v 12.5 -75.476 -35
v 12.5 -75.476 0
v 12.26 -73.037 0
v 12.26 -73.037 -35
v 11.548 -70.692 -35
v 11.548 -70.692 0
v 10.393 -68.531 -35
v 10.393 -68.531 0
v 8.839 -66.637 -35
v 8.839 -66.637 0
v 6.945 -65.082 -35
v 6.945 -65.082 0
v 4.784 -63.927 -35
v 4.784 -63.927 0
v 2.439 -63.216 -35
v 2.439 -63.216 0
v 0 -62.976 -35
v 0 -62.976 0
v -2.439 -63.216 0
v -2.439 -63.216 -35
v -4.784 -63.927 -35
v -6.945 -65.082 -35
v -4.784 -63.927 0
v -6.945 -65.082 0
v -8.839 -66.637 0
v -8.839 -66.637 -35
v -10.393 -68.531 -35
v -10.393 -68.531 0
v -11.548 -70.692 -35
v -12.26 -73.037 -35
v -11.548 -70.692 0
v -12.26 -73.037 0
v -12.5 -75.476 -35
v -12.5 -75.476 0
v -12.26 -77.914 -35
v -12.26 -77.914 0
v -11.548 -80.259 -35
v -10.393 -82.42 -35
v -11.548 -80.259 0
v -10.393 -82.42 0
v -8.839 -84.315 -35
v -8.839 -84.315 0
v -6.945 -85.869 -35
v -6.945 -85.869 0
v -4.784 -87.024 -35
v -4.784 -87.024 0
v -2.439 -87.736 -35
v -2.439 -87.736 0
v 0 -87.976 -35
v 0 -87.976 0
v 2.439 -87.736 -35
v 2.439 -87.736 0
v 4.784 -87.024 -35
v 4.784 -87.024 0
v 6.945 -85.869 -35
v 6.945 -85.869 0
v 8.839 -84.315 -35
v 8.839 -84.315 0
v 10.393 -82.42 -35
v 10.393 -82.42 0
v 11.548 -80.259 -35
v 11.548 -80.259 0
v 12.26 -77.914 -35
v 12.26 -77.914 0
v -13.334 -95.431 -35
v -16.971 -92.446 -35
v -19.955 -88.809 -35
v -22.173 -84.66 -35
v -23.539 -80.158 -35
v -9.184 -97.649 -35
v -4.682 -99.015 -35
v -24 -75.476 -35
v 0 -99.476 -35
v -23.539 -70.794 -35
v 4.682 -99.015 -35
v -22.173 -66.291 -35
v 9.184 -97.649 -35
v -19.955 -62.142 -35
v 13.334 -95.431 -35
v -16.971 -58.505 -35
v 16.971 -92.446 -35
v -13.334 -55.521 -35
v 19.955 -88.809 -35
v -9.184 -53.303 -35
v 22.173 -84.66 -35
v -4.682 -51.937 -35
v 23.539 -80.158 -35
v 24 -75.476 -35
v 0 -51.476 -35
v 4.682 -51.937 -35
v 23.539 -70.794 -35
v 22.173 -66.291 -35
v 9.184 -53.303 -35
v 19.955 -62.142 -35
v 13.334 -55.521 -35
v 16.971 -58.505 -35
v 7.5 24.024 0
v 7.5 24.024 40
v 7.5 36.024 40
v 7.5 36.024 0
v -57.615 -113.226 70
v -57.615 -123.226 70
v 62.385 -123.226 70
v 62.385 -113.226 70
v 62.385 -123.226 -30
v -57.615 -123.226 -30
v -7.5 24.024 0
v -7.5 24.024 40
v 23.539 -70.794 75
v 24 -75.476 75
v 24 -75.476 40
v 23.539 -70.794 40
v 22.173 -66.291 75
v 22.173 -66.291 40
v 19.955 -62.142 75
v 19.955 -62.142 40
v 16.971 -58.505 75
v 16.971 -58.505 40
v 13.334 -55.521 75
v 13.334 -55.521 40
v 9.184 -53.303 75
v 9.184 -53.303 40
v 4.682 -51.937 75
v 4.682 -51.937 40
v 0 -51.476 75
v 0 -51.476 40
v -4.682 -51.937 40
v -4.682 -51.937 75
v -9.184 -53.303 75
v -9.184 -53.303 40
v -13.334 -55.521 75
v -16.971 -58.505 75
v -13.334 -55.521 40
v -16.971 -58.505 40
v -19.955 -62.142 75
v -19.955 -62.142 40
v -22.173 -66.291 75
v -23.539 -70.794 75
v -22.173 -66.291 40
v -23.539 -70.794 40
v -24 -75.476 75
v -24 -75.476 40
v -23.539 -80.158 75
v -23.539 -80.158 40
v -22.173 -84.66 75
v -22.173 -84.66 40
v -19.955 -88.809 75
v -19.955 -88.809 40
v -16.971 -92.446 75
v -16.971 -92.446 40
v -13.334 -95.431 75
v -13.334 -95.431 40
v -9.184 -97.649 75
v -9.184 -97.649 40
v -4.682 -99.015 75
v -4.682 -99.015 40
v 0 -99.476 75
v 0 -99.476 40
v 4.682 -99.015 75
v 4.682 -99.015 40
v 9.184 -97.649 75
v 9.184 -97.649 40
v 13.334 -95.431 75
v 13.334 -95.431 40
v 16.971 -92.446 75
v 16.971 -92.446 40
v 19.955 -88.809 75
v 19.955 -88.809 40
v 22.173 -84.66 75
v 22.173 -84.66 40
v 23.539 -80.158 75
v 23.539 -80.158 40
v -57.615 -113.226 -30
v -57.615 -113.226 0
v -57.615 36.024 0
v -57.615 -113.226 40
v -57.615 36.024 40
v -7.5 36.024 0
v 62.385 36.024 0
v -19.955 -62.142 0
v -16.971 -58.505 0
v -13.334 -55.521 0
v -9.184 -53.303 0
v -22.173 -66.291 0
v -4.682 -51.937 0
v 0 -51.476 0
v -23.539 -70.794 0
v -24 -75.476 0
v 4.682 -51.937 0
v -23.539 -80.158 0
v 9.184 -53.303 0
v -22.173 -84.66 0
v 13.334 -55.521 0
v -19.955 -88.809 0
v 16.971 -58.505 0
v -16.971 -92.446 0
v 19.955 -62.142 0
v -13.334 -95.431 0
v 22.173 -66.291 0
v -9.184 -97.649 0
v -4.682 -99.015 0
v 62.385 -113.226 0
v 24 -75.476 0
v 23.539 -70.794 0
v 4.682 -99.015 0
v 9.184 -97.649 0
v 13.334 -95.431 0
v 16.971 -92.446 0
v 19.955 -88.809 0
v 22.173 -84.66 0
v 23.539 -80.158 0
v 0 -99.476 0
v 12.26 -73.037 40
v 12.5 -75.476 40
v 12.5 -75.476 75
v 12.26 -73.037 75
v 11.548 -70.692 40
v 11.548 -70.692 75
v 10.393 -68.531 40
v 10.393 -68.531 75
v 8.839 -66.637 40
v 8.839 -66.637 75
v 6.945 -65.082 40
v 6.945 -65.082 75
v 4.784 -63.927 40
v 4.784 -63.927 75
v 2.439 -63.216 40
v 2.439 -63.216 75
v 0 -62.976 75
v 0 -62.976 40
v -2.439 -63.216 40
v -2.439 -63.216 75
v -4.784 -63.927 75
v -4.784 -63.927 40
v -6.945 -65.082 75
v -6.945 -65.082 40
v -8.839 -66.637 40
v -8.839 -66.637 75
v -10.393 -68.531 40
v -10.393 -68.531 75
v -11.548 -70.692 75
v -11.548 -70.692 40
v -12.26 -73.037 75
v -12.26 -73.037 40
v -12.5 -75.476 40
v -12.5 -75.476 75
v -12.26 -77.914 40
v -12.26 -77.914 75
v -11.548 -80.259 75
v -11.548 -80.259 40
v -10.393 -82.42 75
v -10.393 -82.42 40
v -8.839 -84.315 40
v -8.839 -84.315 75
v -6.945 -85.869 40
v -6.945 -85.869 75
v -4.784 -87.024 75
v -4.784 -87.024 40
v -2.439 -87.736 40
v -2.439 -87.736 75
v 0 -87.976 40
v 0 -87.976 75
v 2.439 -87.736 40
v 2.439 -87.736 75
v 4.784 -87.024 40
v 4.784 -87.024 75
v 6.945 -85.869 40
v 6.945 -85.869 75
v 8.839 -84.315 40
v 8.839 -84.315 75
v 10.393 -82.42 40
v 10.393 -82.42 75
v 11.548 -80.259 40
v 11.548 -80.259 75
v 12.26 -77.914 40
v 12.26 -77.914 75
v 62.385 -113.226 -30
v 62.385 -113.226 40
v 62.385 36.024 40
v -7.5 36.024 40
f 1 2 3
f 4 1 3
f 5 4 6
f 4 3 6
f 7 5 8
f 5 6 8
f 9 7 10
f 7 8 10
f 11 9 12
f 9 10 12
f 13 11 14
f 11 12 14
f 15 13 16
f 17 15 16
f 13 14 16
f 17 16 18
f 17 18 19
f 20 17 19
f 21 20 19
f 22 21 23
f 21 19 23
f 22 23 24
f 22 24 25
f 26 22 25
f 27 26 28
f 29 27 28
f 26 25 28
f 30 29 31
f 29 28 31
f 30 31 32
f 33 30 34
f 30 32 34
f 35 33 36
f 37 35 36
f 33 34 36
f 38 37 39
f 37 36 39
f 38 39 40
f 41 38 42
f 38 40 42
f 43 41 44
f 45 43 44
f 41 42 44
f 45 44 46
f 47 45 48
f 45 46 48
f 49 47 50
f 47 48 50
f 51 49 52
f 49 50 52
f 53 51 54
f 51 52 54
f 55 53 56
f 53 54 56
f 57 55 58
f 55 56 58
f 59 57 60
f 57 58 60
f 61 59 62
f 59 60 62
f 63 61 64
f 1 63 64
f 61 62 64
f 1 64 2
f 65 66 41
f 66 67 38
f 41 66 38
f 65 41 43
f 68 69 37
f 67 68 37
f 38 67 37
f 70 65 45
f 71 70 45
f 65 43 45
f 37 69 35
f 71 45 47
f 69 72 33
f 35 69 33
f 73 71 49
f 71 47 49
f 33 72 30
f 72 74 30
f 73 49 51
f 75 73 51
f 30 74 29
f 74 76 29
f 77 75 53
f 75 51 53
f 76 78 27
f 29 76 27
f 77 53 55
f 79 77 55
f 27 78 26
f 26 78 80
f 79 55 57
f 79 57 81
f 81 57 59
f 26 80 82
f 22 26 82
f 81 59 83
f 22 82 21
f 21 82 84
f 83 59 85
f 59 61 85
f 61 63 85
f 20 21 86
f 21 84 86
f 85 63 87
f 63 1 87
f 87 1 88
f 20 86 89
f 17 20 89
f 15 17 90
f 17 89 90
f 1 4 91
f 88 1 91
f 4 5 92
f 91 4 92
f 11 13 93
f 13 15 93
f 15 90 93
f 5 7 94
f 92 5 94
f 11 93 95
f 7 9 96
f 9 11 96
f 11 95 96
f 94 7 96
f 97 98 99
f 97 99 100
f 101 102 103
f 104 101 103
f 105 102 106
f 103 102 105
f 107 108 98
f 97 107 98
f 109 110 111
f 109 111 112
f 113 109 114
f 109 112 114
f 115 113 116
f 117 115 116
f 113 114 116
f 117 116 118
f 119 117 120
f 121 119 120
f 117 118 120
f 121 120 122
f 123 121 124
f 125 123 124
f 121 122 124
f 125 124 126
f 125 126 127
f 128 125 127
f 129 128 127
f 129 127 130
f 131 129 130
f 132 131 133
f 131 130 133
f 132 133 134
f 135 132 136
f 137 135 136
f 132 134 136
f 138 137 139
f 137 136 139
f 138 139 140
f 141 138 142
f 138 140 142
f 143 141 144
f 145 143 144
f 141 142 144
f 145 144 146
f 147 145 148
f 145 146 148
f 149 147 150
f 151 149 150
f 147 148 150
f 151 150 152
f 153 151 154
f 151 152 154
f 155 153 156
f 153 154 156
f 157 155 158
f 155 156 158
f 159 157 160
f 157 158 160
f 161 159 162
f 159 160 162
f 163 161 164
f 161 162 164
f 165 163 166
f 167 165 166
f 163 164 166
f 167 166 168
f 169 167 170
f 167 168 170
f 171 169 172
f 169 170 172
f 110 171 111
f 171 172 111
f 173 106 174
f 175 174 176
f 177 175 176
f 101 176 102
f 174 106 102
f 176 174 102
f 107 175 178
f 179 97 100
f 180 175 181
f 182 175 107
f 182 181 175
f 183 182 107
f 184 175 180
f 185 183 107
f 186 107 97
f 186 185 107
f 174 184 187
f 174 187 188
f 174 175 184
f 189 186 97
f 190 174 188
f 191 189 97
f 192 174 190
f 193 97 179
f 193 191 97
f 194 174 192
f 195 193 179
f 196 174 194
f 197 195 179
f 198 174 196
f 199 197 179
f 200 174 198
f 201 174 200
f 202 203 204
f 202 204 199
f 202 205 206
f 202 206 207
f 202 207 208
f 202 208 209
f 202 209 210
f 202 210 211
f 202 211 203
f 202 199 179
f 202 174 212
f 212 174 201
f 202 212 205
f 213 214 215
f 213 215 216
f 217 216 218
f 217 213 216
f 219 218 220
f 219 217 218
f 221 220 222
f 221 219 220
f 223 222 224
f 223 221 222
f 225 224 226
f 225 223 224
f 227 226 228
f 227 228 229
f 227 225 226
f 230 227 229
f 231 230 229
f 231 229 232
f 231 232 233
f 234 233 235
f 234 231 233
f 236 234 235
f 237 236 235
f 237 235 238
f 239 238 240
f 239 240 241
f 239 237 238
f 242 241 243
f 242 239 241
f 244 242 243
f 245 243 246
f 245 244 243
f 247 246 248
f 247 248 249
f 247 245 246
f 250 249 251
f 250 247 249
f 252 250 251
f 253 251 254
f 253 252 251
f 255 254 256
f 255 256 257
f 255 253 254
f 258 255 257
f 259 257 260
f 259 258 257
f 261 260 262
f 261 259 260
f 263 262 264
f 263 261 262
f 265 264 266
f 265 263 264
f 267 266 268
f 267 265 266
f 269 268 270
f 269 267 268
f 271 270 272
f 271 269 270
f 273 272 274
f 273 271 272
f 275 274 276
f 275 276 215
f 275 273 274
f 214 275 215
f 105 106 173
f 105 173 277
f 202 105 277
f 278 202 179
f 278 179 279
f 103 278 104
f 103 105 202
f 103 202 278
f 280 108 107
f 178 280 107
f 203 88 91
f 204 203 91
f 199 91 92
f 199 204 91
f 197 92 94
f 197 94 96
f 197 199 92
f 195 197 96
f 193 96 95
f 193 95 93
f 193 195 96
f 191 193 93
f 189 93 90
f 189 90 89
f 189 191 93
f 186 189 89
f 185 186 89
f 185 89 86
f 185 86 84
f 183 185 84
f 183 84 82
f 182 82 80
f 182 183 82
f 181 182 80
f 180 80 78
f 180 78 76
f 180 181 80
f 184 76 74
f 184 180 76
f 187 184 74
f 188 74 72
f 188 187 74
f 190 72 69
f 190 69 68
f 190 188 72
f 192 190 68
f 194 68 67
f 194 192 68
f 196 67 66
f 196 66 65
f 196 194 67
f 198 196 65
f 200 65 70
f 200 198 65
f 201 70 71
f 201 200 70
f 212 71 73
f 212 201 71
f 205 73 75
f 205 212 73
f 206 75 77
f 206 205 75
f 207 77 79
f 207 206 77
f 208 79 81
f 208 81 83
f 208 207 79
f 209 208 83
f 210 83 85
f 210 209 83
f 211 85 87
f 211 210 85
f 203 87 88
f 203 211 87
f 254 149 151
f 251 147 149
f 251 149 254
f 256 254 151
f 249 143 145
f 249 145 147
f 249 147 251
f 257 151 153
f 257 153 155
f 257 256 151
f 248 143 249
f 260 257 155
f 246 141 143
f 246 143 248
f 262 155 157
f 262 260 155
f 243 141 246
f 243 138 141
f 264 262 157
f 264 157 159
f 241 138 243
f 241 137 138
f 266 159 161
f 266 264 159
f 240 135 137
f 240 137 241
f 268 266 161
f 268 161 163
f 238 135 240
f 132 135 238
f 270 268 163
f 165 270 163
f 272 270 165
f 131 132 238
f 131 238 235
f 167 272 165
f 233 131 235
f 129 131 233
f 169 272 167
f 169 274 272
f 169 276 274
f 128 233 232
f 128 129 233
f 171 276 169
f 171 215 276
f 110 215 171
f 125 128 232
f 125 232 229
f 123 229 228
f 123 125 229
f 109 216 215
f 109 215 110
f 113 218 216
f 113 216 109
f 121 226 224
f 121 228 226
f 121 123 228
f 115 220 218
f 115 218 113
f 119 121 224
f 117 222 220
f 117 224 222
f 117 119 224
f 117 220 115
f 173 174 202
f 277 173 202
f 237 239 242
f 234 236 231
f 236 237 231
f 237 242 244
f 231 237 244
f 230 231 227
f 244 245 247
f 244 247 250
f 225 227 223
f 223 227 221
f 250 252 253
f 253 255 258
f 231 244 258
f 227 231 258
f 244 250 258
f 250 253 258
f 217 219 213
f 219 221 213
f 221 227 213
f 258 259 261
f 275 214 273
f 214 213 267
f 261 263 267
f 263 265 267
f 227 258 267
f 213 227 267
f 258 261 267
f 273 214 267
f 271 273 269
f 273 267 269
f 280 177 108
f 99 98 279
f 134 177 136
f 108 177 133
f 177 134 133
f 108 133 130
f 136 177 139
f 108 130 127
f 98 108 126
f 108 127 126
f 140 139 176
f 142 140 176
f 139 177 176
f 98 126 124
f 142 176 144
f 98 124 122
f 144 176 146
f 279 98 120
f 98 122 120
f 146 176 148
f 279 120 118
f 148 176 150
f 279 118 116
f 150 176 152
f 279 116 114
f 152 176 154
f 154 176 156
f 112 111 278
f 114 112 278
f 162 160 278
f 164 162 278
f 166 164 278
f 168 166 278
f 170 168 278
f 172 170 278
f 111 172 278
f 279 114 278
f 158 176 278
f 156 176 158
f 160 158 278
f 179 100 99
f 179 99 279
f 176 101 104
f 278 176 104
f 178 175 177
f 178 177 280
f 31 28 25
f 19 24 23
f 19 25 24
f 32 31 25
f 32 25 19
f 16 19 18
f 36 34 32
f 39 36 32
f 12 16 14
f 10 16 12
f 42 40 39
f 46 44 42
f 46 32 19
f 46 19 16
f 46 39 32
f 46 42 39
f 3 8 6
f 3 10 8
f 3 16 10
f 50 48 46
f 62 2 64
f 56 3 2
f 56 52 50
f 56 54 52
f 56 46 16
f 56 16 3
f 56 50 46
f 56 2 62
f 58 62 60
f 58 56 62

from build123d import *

# Parameters (mm, degrees)
SKETCH_1_W      = 120
SKETCH_1_H      = 147.25
EXTRUDE_1_DEPTH = 40
SKETCH_2_W      = 50.114502488
SKETCH_2_H      = 40
SKETCH_2_W_2    = 54.885497512
EXTRUDE_2_DEPTH = 12
SKETCH_3_R      = 24
SKETCH_3_R_2    = 12.5
EXTRUDE_3_DEPTH = 35
SKETCH_4_W      = 120
SKETCH_4_H      = 100
EXTRUDE_4_DEPTH = 10


with BuildPart() as part:
    # 草图1 → 凸台-拉伸1 (new body)
    with BuildSketch(Plane.XY):
        with Locations((2.385497512, -49.600771144)):
            Rectangle(SKETCH_1_W, SKETCH_1_H)
    extrude(amount=EXTRUDE_1_DEPTH)

    # 草图2 → 凸台-拉伸2 (add)
    with BuildSketch(Plane(origin=(0, 24.024228856, 0), x_dir=(1, 0, 0), z_dir=(0, 1, 0))):
        with Locations((-32.557251244, -20)):
            Rectangle(SKETCH_2_W, SKETCH_2_H)
        with Locations((34.942748756, -20)):
            Rectangle(SKETCH_2_W_2, SKETCH_2_H)
    extrude(amount=EXTRUDE_2_DEPTH)

    # 草图3 → 凸台-拉伸3 (add)
    with BuildSketch(Plane.XY.offset(40)):
        with Locations((0, -75.475771144)):
            Circle(SKETCH_3_R)
        with Locations((0, -75.475771144)):
            Circle(SKETCH_3_R_2, mode=Mode.SUBTRACT)
    extrude_3 = extrude(amount=EXTRUDE_3_DEPTH)

    # 镜向1: 凸台-拉伸3 across plane
    add(extrude_3.mirror(Plane.XY.offset(20)))

    # 草图4 → 凸台-拉伸4 (add)
    with BuildSketch(Plane.XZ.offset(123.225771144)):
        with Locations((2.385497512, 20)):
            Rectangle(SKETCH_4_W, SKETCH_4_H)
    extrude(amount=-EXTRUDE_4_DEPTH)


solid = part.part
